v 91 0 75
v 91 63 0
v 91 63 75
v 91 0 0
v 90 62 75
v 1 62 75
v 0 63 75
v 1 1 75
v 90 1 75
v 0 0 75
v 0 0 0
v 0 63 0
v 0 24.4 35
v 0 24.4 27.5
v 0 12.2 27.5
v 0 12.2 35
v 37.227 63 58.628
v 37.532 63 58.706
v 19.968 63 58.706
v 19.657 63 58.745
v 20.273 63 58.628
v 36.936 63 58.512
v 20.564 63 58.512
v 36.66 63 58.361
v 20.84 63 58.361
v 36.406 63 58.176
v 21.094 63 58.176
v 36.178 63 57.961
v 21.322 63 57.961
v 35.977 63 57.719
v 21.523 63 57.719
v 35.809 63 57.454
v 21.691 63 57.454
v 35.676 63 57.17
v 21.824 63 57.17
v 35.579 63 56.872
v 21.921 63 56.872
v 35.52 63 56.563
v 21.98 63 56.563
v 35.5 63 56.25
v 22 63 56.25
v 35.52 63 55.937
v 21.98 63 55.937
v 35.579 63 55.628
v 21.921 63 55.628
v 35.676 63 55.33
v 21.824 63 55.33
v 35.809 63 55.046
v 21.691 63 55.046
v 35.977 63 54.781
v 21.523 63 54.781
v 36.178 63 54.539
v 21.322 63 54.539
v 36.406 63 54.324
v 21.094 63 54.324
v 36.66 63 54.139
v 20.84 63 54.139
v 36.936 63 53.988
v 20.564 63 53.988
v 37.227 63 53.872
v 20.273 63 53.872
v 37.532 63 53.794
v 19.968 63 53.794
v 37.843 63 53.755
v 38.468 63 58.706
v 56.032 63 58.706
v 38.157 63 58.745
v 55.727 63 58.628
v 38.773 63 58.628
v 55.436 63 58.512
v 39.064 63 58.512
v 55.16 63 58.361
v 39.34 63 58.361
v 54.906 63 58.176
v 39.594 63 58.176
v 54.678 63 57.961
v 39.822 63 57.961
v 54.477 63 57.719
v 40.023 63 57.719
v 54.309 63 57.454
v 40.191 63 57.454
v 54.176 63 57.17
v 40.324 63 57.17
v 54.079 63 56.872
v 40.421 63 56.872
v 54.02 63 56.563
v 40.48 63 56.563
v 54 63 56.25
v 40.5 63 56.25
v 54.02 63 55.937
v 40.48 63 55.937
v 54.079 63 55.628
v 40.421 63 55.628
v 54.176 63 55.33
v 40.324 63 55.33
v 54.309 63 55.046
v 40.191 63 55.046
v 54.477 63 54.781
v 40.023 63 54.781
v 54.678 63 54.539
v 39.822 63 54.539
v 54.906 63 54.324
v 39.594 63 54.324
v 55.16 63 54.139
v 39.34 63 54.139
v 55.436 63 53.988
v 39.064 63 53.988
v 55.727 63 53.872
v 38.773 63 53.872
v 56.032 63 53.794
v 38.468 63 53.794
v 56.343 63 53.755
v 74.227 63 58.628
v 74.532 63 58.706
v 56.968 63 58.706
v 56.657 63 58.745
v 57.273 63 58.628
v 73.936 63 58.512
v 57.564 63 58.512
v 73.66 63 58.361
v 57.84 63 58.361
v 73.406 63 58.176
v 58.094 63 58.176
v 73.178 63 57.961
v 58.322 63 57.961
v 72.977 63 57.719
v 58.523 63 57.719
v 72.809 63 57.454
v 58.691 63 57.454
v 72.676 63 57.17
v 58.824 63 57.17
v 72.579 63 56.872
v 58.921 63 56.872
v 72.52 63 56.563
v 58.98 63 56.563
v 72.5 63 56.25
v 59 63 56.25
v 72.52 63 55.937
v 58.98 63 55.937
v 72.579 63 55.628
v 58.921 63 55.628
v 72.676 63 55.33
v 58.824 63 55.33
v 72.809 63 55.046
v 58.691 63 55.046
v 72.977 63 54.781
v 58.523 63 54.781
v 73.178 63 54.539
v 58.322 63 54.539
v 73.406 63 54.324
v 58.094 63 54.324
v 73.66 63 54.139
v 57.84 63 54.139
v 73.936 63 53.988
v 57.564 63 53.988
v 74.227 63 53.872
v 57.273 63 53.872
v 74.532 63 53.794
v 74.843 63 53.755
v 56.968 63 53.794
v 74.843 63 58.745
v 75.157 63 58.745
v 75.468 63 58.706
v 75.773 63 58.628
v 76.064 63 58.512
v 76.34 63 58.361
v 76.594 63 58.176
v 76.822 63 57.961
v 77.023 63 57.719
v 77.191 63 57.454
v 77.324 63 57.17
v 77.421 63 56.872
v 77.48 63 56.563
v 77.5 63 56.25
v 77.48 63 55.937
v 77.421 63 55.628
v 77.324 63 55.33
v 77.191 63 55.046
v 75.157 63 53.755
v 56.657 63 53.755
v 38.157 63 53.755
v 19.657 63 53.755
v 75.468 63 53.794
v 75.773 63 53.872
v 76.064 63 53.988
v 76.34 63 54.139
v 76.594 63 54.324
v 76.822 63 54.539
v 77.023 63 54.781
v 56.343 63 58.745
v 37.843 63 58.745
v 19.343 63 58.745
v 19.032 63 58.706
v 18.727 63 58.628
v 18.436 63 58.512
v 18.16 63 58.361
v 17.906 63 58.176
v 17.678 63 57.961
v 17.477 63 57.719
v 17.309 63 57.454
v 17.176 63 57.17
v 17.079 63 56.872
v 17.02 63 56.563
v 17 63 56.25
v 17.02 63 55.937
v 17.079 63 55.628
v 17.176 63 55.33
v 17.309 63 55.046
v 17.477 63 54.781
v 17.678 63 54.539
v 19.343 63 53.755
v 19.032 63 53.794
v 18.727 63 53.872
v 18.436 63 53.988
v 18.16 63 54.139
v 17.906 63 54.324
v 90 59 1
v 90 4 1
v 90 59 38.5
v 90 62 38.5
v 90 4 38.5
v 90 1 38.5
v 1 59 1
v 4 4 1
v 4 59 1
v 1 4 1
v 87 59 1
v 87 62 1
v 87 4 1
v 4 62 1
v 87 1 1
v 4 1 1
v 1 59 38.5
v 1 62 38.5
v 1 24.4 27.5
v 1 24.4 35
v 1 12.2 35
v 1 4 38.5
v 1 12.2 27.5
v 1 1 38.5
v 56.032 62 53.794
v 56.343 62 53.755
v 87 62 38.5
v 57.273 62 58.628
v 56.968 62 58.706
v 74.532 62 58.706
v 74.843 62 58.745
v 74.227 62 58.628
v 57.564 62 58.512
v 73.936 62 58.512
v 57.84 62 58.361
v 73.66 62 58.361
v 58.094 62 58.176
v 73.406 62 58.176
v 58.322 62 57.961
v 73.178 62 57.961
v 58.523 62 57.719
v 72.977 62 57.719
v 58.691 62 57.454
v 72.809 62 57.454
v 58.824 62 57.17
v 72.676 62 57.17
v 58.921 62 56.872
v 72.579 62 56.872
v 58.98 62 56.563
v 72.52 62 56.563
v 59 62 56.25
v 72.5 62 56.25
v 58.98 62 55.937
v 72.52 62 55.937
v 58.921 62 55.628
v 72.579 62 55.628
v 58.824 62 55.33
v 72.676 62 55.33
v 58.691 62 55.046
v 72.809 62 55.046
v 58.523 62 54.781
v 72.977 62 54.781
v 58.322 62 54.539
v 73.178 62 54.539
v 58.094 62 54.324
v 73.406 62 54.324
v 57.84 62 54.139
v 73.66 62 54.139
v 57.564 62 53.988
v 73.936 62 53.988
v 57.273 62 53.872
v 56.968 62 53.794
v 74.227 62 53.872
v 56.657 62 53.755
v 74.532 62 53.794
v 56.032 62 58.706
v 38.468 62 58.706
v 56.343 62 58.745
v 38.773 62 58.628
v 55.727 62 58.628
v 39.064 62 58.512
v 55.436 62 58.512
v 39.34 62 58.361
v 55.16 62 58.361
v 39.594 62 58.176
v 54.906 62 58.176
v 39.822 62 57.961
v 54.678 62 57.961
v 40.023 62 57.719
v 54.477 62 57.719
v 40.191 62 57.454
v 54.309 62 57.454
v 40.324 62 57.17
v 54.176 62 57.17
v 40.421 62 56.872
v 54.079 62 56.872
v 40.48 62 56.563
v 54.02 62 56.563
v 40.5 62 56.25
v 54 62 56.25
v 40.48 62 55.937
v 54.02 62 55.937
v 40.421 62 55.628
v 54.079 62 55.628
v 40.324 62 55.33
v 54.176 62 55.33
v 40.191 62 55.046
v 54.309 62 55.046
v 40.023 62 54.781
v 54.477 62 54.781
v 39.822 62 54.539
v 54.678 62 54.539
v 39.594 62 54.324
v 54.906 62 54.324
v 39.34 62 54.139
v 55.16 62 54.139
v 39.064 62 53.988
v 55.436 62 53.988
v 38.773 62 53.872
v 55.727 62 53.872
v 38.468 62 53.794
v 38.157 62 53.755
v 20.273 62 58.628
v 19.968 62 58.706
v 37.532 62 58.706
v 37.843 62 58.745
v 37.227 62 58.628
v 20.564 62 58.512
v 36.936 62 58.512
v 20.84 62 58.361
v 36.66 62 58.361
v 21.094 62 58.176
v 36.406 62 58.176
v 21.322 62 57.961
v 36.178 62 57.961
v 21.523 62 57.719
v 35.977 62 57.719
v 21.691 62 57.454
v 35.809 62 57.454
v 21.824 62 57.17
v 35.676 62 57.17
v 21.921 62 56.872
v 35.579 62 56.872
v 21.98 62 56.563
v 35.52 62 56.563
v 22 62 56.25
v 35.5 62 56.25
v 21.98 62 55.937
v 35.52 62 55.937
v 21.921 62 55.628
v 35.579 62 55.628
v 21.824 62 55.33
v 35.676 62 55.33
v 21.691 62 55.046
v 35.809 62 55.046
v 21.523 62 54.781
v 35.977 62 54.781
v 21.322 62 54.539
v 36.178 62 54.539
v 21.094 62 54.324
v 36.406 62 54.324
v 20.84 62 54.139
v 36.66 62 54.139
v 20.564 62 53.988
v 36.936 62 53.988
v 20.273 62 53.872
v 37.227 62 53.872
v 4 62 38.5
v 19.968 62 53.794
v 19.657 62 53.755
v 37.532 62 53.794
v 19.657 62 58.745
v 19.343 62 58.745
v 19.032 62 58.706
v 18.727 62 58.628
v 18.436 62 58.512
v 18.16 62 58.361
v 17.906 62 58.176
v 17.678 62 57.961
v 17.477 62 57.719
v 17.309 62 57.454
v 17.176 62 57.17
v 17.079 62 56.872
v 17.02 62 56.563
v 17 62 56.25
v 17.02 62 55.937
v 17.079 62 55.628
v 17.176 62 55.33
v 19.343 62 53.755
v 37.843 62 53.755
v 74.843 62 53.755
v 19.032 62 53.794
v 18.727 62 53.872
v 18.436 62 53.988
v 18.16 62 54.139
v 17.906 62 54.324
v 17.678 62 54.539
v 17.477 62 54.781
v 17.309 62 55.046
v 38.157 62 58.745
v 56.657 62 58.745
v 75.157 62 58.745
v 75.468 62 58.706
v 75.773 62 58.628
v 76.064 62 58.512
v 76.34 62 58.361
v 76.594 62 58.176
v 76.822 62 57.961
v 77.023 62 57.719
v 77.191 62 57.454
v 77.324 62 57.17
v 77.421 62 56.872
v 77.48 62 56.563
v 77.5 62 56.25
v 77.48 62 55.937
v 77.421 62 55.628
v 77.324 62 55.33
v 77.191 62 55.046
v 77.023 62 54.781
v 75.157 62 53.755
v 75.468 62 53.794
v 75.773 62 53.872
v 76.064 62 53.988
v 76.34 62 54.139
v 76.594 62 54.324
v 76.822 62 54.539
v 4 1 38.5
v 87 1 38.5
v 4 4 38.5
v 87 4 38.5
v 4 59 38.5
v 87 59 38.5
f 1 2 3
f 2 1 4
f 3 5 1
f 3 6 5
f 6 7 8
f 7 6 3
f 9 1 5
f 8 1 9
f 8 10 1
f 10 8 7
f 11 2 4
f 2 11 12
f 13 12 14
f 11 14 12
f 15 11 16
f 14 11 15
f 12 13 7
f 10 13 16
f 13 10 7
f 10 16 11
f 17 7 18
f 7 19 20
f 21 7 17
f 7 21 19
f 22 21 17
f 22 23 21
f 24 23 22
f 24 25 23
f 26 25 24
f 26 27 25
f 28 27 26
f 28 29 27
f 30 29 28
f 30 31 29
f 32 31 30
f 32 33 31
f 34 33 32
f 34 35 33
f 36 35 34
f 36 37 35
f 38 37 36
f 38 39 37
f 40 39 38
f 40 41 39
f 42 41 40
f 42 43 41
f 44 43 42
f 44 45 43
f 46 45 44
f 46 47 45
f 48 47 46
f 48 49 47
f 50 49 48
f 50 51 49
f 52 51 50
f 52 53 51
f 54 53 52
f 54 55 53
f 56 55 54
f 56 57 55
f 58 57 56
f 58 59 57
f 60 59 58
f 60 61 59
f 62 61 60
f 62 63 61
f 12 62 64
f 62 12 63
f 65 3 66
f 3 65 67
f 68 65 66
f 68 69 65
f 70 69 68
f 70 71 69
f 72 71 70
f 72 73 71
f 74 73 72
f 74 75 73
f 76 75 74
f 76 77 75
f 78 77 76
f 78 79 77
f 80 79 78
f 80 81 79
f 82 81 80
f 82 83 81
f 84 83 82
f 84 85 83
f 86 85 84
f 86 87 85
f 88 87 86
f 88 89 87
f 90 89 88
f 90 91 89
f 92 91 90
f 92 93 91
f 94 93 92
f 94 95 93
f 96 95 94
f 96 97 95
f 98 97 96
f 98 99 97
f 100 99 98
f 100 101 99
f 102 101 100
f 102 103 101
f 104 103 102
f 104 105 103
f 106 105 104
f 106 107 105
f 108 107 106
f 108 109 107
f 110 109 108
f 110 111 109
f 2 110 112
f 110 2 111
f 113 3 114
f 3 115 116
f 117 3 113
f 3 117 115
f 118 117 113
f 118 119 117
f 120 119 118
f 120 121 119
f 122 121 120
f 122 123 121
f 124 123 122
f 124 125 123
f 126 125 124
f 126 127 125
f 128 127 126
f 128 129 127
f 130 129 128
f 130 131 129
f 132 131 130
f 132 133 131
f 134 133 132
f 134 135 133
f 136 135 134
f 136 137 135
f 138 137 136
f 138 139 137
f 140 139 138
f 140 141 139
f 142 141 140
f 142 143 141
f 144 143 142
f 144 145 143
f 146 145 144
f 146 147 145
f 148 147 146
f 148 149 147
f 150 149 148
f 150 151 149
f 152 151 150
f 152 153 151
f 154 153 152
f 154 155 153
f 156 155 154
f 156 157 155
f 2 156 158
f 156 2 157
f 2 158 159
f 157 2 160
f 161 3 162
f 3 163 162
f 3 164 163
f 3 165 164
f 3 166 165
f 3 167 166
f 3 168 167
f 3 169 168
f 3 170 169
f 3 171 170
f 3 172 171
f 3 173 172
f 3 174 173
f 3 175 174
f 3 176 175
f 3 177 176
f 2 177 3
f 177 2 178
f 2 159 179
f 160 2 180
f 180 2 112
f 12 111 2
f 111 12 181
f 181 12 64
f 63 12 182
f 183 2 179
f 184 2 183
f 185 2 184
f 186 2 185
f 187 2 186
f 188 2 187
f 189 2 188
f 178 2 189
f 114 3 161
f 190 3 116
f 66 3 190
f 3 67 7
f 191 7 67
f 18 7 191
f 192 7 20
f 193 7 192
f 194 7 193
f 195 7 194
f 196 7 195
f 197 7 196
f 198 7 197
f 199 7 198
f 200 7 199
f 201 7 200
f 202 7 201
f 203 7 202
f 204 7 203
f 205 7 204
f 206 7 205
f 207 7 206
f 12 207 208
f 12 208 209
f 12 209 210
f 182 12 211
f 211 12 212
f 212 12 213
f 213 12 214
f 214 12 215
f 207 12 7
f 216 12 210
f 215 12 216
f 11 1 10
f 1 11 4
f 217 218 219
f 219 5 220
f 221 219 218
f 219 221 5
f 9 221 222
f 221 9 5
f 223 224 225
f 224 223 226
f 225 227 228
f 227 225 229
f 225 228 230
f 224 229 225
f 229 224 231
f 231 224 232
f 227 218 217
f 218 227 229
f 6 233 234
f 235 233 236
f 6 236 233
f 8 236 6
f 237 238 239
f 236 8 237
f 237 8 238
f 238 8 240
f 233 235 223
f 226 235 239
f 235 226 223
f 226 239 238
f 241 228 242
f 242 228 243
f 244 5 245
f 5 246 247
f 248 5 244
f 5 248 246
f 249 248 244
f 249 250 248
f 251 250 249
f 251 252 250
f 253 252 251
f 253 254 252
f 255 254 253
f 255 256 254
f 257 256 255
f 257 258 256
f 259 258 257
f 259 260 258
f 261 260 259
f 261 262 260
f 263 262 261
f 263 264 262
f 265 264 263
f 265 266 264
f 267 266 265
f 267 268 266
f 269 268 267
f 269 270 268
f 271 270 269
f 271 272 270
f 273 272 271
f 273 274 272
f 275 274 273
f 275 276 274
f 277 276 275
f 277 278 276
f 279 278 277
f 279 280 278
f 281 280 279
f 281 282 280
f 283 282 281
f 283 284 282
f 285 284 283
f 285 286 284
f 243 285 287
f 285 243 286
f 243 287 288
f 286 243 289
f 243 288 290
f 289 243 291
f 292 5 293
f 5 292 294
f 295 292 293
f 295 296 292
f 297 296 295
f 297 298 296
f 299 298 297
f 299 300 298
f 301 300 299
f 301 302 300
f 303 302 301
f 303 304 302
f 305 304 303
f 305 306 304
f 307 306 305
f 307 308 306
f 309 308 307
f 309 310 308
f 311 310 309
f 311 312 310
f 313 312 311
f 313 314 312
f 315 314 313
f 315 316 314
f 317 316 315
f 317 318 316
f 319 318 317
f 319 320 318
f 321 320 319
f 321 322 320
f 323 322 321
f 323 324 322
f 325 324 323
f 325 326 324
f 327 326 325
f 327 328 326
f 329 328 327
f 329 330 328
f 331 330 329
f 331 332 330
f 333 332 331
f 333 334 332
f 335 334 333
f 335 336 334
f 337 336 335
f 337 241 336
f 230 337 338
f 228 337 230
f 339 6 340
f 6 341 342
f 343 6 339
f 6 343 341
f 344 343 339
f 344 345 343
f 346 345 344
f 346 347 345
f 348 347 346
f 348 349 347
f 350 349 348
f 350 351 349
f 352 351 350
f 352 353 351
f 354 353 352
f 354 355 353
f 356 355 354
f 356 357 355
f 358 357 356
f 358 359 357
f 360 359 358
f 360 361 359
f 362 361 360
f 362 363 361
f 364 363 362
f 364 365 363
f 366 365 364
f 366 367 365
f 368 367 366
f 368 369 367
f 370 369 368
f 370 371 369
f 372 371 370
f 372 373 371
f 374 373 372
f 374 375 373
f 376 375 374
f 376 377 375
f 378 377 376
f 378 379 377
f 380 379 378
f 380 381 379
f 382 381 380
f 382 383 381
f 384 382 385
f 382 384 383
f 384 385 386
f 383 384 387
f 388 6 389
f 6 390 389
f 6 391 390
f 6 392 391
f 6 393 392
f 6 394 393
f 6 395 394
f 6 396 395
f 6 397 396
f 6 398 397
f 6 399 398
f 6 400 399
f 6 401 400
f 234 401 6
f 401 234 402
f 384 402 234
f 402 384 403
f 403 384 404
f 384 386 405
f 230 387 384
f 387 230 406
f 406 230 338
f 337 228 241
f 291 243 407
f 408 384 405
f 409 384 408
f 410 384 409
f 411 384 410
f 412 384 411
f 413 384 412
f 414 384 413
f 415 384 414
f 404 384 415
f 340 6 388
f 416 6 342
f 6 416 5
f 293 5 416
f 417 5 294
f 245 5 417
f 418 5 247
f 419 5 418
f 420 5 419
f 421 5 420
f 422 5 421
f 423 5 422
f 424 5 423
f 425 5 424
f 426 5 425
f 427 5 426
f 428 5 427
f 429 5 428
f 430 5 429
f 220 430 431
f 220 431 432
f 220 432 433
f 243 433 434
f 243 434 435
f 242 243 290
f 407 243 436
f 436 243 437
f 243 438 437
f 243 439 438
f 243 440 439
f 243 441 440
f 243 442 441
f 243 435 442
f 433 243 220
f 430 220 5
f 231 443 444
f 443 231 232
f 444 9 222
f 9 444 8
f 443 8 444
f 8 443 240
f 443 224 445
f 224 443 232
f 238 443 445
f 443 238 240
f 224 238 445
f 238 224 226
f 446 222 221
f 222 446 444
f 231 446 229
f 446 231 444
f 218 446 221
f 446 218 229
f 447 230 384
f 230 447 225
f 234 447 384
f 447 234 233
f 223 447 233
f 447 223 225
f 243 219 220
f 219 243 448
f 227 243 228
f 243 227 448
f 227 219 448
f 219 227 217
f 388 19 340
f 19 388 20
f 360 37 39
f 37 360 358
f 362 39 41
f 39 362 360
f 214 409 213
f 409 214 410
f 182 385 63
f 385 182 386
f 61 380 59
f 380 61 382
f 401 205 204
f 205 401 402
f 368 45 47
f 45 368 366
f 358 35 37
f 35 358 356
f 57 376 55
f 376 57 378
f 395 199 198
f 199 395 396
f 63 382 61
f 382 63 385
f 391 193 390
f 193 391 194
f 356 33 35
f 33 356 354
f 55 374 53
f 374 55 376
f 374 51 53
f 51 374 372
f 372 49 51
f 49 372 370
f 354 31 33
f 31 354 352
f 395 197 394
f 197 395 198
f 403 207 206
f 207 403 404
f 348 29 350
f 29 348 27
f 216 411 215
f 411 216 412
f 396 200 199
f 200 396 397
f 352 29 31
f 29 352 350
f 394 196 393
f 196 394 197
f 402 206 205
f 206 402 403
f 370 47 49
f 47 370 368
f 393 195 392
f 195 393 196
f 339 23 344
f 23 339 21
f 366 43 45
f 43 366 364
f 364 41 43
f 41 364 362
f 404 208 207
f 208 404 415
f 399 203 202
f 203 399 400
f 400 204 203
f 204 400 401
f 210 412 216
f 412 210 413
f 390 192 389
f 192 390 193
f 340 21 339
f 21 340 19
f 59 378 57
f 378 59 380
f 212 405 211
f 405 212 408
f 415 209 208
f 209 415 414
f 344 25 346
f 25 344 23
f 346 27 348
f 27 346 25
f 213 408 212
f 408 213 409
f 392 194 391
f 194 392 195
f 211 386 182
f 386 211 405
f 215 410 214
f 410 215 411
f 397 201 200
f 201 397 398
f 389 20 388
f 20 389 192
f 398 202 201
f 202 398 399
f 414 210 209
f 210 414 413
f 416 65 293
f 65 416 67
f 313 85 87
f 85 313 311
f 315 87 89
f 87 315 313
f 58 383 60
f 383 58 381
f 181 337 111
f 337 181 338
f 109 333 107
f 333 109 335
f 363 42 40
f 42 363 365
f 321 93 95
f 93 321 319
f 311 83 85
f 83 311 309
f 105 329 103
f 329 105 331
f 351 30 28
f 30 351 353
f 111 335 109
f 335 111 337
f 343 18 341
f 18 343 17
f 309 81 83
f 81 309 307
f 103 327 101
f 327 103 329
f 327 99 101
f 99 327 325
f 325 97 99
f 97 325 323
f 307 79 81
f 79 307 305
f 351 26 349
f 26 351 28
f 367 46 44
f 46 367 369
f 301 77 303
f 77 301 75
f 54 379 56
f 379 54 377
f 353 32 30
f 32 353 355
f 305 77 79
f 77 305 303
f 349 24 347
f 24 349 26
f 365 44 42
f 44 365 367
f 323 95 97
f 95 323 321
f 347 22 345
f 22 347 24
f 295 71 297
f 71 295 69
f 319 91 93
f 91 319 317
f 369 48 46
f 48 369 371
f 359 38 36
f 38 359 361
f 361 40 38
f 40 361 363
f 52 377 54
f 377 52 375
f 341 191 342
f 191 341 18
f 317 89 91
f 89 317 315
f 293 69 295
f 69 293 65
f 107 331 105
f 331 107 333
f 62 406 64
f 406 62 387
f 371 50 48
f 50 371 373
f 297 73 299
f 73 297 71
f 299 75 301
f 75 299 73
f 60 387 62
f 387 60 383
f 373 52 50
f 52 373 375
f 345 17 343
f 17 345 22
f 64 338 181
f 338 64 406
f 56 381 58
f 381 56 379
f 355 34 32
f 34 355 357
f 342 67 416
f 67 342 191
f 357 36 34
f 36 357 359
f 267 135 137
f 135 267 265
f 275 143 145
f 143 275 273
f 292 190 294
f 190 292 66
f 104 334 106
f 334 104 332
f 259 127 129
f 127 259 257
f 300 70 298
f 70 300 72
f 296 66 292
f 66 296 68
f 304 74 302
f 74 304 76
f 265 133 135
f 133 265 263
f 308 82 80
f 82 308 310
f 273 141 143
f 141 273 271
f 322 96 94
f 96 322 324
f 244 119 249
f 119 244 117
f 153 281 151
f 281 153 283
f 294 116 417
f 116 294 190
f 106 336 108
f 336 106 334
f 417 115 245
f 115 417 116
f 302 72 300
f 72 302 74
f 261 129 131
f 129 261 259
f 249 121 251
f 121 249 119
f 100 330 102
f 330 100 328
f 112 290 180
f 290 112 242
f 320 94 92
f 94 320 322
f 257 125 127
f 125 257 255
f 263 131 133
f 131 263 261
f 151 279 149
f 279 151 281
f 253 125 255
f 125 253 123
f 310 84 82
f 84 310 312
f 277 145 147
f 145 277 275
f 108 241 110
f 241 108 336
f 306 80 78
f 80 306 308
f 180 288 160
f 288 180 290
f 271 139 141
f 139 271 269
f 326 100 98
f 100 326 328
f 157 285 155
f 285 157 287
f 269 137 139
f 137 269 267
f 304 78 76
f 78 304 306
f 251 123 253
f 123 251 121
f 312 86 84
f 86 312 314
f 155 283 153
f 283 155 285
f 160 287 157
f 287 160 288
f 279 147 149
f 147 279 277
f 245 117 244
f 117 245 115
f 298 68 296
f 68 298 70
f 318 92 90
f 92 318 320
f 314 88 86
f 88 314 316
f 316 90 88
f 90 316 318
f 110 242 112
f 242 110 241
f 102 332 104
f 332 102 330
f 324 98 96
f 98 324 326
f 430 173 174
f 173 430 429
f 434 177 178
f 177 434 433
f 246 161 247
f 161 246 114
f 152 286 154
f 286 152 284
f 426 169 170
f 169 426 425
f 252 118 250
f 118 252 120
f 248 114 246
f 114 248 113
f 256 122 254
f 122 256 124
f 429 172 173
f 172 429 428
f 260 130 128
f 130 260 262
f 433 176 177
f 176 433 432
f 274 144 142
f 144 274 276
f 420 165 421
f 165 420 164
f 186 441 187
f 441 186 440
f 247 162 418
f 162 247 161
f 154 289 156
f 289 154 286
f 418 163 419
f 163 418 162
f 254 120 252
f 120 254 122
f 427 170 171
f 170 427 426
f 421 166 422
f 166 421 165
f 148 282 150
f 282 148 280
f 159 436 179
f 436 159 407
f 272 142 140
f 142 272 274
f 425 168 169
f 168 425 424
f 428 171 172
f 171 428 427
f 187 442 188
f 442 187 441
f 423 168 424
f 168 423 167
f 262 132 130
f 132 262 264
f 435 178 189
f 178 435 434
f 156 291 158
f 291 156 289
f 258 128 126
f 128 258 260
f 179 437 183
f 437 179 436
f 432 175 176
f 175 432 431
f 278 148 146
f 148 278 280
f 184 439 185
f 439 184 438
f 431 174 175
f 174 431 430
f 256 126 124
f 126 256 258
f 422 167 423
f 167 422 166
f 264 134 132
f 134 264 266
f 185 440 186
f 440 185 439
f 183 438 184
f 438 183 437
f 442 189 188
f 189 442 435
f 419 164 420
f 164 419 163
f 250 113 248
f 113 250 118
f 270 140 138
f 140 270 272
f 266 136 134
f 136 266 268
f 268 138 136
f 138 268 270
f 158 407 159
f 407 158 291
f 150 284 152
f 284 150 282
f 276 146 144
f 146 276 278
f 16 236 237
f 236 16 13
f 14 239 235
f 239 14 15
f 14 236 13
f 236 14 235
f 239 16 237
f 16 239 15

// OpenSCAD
// Credit Card Box Dimensions
BOX_LENGTH = 89;
BOX_WIDTH = 61;
BOX_HEIGHT = 75;
WALL_THICKNESS = 1;
HOVER_GAP = 5;
LID_THICKNESS = 1;
INSET_WIDTH = 1;
INSET_HEIGHT = 2;
INSET_GAP = 10.5;

 // Adding posts in each corner
// Post dimensions
POST_SIZE = 3;
POST_WIDTH = POST_SIZE;
POST_DEPTH = POST_SIZE;
POST_HEIGHT = BOX_HEIGHT / 2;

// Lid Clearance
LID_CLEARANCE = 0.2; // Small gap for easy lid fitting
LID_HEIGHT = 5; // Height of the lid

// New constants for drilling holes
HOLE_DIAMETER = 5; // Diameter of each hole
HOLE_Y_DISTANCE = BOX_HEIGHT - (BOX_HEIGHT / 4); // Distance of holes from the base of the box

// USB details
USB_HEIGHT = BOX_HEIGHT / 10;
USB_WIDTH = BOX_WIDTH / 5;
USB_X_OFFSET = (BOX_WIDTH / 5);
USB_Y_OFFSET = (POST_HEIGHT) - (USB_HEIGHT * 1 + (USB_HEIGHT / 3));

// Function to create the main box
module box() {
    difference() {
        // Outer dimensions
        cube([BOX_LENGTH + 2*WALL_THICKNESS, BOX_WIDTH + 2*WALL_THICKNESS, BOX_HEIGHT]);
        // Inner cavity
        translate([WALL_THICKNESS, WALL_THICKNESS, WALL_THICKNESS])
        cube([BOX_LENGTH, BOX_WIDTH, BOX_HEIGHT + WALL_THICKNESS]); // Extend inner cavity into the lid area for a flush fit
    }
    
      
    // Bottom left front post
    translate([WALL_THICKNESS, WALL_THICKNESS, WALL_THICKNESS])
    cube([POST_WIDTH, POST_DEPTH, POST_HEIGHT]);
    
    // Bottom right front post
    translate([BOX_LENGTH + WALL_THICKNESS - POST_WIDTH, WALL_THICKNESS, WALL_THICKNESS])
    cube([POST_WIDTH, POST_DEPTH, POST_HEIGHT]);
    
    // Bottom left back post
    translate([WALL_THICKNESS, BOX_WIDTH + WALL_THICKNESS - POST_DEPTH, WALL_THICKNESS])
    cube([POST_WIDTH, POST_DEPTH, POST_HEIGHT]);
    
    // Bottom right back post
    translate([BOX_LENGTH + WALL_THICKNESS - POST_WIDTH, BOX_WIDTH + WALL_THICKNESS - POST_DEPTH, WALL_THICKNESS])
    cube([POST_WIDTH, POST_DEPTH, POST_HEIGHT]);
}

// Function to drill holes into the long side of the box
module drillHoles() {
    for(i = [1:4]) {
        translate([
            WALL_THICKNESS + (BOX_LENGTH - (3 * HOLE_DIAMETER)) * i / 4, // Evenly space along the length, adjusting for hole diameter
            BOX_WIDTH + 2*WALL_THICKNESS + 1, // Position to drill through the wall thickness
            HOLE_Y_DISTANCE
        ])
        rotate([90, 0, 0])
        cylinder(d = HOLE_DIAMETER, h = WALL_THICKNESS * 2, $fn=50);
    }
    
    translate([-1, USB_X_OFFSET, USB_Y_OFFSET]) {
        rotate([0, 0, 0])
        cube([WALL_THICKNESS * 3, USB_WIDTH, USB_HEIGHT]);
    }
}

// Function to create the box with holes
module boxWithHoles() {
    difference() 
    {
        // Original box design
        box();
        // Drill holes
        drillHoles();
    }
}

// Updated function to create the lid with an inset
module lid() {
    // Outer lid
    translate([0, 0, BOX_HEIGHT + HOVER_GAP])
    cube([BOX_LENGTH + 2*LID_THICKNESS, BOX_WIDTH + 2*LID_THICKNESS, LID_THICKNESS]);

    // Inset for the lid to fit into the box
//    translate([WALL_THICKNESS + floor(INSET_GAP/2), WALL_THICKNESS + floor(INSET_GAP/2), BOX_HEIGHT + HOVER_GAP + (LID_THICKNESS * -1)])
    translate([WALL_THICKNESS * 2, WALL_THICKNESS * 2, BOX_HEIGHT + HOVER_GAP + (LID_THICKNESS * -1)])
    color("red")
    cube([(BOX_LENGTH - (WALL_THICKNESS * 2)), BOX_WIDTH - (WALL_THICKNESS * 2), LID_THICKNESS]);
}

module rotateLid() {
    translate([-(LID_THICKNESS + HOVER_GAP), 0, BOX_HEIGHT + (LID_THICKNESS * 6)])
    rotate([0, 180, 0])
    lid();
}

// Rendering the box and lid
boxWithHoles();
//rotateLid();
